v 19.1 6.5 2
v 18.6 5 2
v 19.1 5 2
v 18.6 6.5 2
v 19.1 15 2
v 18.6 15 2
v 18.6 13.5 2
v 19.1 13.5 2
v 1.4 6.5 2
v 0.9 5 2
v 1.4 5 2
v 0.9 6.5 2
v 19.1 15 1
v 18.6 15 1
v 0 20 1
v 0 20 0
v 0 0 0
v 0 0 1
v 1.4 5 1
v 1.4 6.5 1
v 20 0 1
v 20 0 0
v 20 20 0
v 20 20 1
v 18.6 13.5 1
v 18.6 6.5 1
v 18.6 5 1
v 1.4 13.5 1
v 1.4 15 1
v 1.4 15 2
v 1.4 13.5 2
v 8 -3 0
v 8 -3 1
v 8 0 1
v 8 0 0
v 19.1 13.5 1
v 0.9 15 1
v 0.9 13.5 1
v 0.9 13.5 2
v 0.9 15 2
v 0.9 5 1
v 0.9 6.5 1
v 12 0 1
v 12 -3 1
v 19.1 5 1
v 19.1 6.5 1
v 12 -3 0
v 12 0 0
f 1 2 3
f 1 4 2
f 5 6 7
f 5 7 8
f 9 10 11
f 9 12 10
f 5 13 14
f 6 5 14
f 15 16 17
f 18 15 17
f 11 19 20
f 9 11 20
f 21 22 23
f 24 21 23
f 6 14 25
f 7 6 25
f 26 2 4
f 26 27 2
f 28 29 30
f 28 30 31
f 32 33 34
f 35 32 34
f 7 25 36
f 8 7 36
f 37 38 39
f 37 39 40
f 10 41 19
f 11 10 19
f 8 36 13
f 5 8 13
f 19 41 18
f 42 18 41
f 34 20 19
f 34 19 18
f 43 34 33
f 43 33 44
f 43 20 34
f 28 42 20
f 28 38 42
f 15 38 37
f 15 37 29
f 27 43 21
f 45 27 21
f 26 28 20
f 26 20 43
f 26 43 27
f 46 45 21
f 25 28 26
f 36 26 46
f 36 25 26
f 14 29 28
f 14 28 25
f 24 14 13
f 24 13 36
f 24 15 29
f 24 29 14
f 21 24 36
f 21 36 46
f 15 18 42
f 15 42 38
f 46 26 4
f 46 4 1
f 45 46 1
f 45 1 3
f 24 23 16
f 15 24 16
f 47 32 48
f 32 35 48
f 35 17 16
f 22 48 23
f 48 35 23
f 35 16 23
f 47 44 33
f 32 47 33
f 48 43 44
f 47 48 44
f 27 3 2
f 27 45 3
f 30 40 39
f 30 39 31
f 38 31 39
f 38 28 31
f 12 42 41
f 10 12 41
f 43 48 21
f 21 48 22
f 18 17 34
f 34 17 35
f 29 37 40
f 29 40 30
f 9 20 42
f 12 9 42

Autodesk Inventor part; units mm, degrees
ref_plane "YZ Plane" through (0, 0, 0) normal (1, 0, 0) x (0, 1, 0)
ref_plane "XZ Plane" through (0, 0, 0) normal (0, 1, 0) x (-1, 0, 0)
ref_plane "XY Plane" through (0, 0, 0) normal (0, 0, 1) x (1, 0, 0)
sketch "Esboço1" plane through (0, 0, 0) normal (0, 0, 1) x (1, 0, 0)
  line L0 (0, 0) -> (20, 0)
  line L1 (20, 0) -> (20, 20)
  line L2 (20, 20) -> (0, 20)
  line L3 (0, 20) -> (0, 0)
  dimension "d0" = 20
  dimension "d1" = 20
extrude "Extrusão1" add sketch "Esboço1" along normal blind 1
sketch "Esboço2" plane through (0, 0, 1) normal (0, 0, 1) x (1, 0, 0)
  line L0 (0.9, 15) -> (1.4, 15)
  line L1 (1.4, 15) -> (1.4, 13.5)
  line L2 (1.4, 13.5) -> (0.9, 13.5)
  line L3 (0.9, 13.5) -> (0.9, 15)
  line L4 (0.9, 5) -> (1.4, 5)
  line L5 (1.4, 5) -> (1.4, 6.5)
  line L6 (1.4, 6.5) -> (0.9, 6.5)
  line L7 (0.9, 6.5) -> (0.9, 5)
  line L8 (0, 20) -> (0, 0) projected
  line L9 (0, 0) -> (20, 0) projected
  line L10 (20, 20) -> (0, 20) projected
  line L11 (10, 20) -> (10, 0)
  line L12 (19.1, 15) -> (18.6, 15)
  line L13 (18.6, 15) -> (18.6, 13.5)
  line L14 (18.6, 13.5) -> (19.1, 13.5)
  line L15 (19.1, 13.5) -> (19.1, 15)
  line L16 (19.1, 5) -> (18.6, 5)
  line L17 (18.6, 5) -> (18.6, 6.5)
  line L18 (18.6, 6.5) -> (19.1, 6.5)
  line L19 (19.1, 6.5) -> (19.1, 5)
  dimension "d4" = 1.5
  dimension "d5" = 0.5
  dimension "d6" = 0.5
  dimension "d7" = 1.5
  dimension "d8" = 0.9
  dimension "d9" = 5
  dimension "d10" = 5
extrude "Extrusão2" add sketch "Esboço2" along normal blind 1 contours L0 L1 L2 L3 | L7 L6 L5 L4 | L15 L14 L13 L12 | L16 L17 L18 L19
sketch "Esboço3" plane through (0, 0, 1) normal (0, 0, 1) x (1, 0, 0)
  line L0 (0, 0) -> (20, 0) projected
  line L1 (8, 0) -> (12, 0)
  line L2 (12, 0) -> (12, -3)
  line L3 (12, -3) -> (8, -3)
  line L4 (8, -3) -> (8, 0)
  dimension "d13" = 8
  dimension "d14" = 8
  dimension "d15" = 3
extrude "Extrusão3" add sketch "Esboço3" against normal blind 1
properties part number "caixaled_pt2" material "Plástico PC/ABS"
